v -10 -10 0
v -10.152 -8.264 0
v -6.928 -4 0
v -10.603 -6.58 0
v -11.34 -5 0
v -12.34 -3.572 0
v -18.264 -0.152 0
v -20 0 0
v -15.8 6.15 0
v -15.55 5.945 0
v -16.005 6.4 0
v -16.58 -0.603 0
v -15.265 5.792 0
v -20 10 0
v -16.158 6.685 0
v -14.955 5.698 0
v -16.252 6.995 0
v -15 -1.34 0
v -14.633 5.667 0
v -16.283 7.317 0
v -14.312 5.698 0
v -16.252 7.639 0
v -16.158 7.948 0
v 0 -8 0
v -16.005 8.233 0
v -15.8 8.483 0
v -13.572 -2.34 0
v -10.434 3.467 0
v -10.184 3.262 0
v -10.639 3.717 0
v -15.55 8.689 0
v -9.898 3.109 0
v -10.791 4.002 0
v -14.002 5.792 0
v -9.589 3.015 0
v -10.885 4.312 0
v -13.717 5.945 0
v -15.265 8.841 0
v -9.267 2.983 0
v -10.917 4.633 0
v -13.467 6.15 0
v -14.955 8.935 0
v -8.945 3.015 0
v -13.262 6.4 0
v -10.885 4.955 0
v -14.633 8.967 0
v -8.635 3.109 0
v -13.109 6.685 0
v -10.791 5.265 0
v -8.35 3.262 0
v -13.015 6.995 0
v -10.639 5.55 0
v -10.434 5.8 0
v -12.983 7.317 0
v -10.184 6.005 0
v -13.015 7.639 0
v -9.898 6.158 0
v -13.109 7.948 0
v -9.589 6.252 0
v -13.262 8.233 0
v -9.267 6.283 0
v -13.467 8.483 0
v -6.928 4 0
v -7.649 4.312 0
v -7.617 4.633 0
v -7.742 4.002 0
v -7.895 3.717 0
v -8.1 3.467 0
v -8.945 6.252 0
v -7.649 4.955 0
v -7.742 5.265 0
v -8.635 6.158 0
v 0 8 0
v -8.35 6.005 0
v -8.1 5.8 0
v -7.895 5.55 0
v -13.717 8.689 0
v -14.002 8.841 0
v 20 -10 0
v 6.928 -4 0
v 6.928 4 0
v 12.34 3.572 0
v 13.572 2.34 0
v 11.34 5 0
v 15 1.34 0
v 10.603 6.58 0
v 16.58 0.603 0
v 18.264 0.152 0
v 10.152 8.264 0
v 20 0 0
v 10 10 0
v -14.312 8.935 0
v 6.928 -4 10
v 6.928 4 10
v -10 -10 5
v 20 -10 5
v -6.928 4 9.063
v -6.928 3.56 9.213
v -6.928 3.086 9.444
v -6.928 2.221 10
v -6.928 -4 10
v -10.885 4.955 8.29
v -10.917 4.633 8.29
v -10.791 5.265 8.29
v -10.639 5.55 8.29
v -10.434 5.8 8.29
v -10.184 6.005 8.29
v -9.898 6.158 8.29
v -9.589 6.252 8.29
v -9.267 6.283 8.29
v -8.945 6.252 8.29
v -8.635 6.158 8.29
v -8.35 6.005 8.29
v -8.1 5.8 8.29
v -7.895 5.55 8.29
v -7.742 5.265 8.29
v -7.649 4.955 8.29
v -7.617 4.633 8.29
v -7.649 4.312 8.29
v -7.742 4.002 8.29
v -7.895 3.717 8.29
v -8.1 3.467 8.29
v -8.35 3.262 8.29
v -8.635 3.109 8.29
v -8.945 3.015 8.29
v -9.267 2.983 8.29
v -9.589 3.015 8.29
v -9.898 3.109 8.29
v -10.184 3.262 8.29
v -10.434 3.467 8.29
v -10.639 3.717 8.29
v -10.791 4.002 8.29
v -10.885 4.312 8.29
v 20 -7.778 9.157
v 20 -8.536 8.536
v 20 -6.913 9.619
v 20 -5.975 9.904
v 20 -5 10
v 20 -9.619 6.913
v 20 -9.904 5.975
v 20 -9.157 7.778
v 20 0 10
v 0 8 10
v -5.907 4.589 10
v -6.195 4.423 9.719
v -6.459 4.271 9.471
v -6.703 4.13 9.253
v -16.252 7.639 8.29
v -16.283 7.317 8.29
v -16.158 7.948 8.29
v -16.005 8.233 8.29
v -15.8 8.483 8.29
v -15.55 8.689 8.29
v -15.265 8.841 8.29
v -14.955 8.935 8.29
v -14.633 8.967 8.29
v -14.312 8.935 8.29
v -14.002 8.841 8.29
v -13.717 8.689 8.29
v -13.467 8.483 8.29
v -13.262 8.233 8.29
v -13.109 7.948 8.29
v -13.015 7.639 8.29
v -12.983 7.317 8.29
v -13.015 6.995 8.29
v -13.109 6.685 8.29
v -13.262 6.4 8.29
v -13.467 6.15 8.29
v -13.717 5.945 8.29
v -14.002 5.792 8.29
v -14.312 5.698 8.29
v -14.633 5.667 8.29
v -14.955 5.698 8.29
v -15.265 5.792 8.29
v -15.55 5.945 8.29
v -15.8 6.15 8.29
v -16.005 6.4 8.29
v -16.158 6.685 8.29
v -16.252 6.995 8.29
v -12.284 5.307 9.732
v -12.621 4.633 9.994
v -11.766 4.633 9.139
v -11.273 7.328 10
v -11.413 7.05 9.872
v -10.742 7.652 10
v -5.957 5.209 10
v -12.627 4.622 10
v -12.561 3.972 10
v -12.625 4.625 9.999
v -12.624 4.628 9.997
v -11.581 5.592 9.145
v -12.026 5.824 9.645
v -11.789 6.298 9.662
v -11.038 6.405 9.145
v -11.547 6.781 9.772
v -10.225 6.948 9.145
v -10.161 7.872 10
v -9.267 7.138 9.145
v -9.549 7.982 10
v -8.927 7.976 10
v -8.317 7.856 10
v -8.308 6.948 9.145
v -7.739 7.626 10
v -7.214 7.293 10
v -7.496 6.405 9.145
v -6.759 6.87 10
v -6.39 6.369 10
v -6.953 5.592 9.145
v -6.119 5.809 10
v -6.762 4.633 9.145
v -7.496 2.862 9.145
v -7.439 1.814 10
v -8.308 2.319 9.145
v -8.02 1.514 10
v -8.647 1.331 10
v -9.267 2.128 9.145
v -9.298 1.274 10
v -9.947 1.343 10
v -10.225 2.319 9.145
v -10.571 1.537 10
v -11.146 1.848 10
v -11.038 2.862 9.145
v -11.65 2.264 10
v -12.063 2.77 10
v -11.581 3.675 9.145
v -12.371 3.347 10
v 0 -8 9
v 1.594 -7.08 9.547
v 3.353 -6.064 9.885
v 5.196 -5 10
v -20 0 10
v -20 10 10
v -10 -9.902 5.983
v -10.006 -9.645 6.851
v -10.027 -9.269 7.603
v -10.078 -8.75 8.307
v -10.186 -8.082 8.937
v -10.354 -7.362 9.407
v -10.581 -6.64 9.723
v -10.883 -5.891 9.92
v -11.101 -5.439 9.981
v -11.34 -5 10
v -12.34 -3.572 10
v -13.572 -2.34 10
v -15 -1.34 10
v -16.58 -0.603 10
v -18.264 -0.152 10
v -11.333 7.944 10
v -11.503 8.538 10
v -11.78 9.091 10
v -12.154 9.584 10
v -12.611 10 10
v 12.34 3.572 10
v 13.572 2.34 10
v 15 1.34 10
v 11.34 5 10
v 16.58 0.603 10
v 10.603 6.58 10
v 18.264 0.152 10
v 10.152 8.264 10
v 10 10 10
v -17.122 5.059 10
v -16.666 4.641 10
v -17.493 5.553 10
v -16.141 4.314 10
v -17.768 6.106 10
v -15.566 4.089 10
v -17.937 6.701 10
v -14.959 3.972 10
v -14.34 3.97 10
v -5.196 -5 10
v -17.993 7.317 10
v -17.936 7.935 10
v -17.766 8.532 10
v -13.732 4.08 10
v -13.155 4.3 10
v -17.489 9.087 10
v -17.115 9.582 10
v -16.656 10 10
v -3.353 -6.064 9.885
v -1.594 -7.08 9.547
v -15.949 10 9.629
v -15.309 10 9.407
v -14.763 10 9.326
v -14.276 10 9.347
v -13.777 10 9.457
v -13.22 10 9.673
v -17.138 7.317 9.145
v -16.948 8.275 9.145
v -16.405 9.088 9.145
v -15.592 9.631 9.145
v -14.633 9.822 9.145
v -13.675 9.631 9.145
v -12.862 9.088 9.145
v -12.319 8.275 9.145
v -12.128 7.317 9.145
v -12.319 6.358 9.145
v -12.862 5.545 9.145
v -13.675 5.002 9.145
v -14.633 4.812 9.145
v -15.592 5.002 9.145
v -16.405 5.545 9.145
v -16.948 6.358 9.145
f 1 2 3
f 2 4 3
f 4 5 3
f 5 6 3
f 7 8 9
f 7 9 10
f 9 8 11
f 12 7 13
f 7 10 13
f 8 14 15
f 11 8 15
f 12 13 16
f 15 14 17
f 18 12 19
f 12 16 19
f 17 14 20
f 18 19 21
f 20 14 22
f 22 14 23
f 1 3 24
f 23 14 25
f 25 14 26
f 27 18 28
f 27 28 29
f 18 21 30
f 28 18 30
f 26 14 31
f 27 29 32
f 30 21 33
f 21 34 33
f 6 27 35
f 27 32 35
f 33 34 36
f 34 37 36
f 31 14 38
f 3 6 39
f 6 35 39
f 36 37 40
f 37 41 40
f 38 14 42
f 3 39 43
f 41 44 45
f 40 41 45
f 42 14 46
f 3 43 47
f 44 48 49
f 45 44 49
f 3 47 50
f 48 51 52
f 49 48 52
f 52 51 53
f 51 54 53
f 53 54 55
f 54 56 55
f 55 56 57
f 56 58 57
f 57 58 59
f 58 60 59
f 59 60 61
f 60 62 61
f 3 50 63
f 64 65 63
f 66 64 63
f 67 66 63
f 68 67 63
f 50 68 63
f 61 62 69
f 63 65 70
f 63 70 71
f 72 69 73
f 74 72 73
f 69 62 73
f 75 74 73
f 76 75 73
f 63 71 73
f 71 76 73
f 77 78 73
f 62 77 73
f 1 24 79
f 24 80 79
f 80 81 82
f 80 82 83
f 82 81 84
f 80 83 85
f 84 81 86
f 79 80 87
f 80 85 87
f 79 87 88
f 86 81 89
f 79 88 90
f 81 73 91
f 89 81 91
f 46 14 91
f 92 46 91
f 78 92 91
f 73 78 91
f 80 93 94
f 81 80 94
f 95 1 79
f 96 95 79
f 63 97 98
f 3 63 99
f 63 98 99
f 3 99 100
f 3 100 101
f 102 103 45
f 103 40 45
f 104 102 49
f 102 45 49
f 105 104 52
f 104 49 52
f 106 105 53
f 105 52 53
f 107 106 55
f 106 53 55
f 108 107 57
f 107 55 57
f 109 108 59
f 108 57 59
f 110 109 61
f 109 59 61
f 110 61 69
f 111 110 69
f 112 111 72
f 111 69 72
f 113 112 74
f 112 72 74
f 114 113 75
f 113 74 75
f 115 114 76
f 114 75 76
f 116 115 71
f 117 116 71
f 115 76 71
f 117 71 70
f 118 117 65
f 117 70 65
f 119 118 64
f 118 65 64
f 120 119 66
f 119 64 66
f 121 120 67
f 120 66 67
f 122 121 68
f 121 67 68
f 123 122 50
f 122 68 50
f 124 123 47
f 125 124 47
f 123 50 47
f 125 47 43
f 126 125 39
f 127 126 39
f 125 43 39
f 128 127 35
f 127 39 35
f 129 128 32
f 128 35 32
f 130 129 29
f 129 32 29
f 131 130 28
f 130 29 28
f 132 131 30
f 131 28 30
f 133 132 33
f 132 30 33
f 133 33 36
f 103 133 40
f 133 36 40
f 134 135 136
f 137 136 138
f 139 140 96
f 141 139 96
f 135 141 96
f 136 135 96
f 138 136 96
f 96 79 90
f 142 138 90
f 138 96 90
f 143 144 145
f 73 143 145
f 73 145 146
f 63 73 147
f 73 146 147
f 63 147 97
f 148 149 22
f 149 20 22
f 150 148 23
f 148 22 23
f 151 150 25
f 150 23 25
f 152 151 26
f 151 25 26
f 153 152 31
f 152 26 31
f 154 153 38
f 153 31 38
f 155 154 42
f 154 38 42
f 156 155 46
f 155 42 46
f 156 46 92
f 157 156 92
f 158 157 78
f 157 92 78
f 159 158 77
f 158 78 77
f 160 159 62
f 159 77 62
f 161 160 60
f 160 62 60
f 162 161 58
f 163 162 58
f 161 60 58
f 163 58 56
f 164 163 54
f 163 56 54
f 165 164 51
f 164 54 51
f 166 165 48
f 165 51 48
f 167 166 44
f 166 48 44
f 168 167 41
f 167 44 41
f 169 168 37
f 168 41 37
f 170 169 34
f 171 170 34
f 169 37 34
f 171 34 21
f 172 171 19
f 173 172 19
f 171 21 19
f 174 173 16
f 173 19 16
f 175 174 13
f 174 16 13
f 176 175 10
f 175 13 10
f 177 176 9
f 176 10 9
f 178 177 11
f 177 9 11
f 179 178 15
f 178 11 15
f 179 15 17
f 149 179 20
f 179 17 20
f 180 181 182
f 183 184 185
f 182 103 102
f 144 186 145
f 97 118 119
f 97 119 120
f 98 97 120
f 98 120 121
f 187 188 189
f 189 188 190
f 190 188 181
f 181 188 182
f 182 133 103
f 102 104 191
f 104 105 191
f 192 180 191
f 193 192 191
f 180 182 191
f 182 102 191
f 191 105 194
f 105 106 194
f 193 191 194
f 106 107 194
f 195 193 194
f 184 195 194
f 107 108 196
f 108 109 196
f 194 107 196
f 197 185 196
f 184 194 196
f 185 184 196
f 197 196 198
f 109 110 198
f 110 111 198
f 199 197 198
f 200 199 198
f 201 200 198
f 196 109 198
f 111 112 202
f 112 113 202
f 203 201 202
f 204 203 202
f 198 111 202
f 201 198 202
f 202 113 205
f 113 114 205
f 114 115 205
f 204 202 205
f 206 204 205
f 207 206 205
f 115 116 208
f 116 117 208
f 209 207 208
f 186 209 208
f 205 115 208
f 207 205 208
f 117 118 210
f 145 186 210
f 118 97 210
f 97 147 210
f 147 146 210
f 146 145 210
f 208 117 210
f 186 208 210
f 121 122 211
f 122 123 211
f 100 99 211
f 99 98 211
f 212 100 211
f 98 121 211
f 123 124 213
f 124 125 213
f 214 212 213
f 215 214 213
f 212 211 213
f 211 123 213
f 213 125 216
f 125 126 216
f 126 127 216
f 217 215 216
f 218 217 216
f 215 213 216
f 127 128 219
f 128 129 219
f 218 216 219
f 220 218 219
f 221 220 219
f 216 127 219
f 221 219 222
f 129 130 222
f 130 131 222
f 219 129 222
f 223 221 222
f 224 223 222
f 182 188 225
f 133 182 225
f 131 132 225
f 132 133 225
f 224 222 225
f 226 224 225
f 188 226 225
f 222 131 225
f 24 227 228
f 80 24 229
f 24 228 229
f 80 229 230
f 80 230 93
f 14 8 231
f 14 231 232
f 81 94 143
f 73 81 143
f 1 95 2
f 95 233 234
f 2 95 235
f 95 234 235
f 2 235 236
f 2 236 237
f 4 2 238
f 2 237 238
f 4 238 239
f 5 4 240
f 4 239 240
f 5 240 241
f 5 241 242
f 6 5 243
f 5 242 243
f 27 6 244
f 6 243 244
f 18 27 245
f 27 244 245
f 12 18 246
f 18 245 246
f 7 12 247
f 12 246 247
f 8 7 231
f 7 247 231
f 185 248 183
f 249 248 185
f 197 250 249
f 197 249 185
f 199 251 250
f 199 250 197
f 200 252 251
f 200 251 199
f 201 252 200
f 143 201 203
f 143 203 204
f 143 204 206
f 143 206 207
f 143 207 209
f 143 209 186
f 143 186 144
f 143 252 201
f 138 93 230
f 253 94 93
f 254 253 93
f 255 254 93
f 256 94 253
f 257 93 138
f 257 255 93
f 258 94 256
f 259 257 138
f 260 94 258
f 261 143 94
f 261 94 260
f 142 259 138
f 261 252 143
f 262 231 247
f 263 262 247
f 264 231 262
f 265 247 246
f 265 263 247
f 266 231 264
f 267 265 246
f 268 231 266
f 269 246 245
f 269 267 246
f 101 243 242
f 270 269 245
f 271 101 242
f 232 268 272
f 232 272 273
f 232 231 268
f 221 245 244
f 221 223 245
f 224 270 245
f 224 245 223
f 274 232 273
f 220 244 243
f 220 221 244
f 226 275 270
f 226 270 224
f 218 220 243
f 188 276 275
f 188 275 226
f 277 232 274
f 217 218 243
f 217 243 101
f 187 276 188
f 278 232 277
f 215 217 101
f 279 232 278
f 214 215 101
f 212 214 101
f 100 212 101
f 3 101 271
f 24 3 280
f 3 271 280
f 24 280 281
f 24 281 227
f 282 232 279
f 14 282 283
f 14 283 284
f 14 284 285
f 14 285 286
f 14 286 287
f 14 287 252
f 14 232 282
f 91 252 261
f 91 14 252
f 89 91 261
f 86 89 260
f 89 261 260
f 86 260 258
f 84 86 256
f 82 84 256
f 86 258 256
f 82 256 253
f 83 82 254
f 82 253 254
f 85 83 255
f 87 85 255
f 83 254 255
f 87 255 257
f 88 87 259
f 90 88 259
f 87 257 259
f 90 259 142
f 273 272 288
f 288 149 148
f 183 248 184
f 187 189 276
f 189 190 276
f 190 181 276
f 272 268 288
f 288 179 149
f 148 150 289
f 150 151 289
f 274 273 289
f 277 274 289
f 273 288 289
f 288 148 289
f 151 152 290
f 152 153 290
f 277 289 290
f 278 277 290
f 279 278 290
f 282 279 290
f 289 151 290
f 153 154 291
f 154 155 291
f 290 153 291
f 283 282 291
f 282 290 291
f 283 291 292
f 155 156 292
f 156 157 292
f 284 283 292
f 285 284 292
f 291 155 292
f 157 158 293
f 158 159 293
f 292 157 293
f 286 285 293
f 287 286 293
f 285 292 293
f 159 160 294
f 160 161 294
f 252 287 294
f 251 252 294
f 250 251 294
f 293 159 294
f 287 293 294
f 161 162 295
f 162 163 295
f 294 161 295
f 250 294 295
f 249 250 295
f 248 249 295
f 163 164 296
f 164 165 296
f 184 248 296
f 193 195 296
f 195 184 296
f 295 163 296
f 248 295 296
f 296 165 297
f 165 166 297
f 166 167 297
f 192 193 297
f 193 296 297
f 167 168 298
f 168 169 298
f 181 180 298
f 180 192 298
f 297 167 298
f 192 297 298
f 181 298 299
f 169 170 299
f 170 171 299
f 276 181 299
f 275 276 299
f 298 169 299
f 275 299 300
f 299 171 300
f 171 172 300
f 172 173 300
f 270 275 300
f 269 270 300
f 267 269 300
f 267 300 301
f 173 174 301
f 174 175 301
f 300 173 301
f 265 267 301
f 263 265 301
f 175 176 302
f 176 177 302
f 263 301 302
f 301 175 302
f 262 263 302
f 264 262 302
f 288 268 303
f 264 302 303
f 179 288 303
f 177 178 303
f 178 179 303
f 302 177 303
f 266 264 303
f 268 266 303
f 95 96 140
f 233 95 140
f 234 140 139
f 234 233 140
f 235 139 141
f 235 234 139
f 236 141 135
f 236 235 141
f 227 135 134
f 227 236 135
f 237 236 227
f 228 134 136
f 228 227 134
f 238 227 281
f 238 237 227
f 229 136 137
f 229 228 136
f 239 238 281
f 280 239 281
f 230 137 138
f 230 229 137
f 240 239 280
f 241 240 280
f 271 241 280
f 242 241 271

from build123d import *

# Parameters (mm, degrees)
F0_W           = 40
F0_H           = 20
F1_DEPTH       = 10
F3_DEPTH       = 25
F5_D           = 3.3
F5_CSINK_D     = 6.72
F5_CSINK_ANGLE = 90
F6_T1_DEPTH    = 55


# Not quite as in the source:
# - a fillet or chamfer that OpenCascade refuses, or shapes differently, is made with other operations: its cross-section is extruded or revolved along the edge and cut away or added


with BuildPart() as f1:
    # F0 (on Top) → F1 (new body)
    with BuildSketch(Plane.XY):
        Rectangle(F0_W, F0_H)
    extrude(amount=F1_DEPTH)

    # F2 (on face) → F3 (cut)
    with BuildSketch(Plane.XY.offset(10)):
        Polygon((0, -8), (6.9282032303, -4), (6.9282032303, 4), (0, 8), (-6.9282032303, 4), (-6.9282032303, -4), align=None)
        with BuildLine():
            ThreePointArc((-10, -10), (-12.9289321881, -2.9289321881), (-20, 0))
            Line((-20, 0), (-20, -10))
            Line((-20, -10), (-10, -10))
        make_face()
        with BuildLine():
            Line((20, 10), (10, 10))
            ThreePointArc((10, 10), (12.9289321881, 2.9289321881), (20, 0))
            Line((20, 0), (20, 10))
        make_face()
    extrude(amount=-F3_DEPTH, mode=Mode.SUBTRACT)

    # F5 (through all)
    with Locations(Plane.XY.offset(10)):
        with Locations((-14.633436854, 7.316718427), (-9.266873708, 4.633436854)):
            CounterSinkHole(F5_D / 2, F5_CSINK_D / 2, counter_sink_angle=F5_CSINK_ANGLE)

    # F6: fillet of radius 5 on 1 edges, made by hand

    # F6_s2 → F6_t1 (cut)
    with BuildSketch(Plane.YZ.offset(-22.5)):
        with BuildLine():
            ThreePointArc((-10, 5), (-8.5355339059, 8.5355339059), (-5, 10))
            Line((-5, 10), (-10, 10))
            Line((-10, 10), (-10, 5))
        make_face()
    extrude(amount=F6_T1_DEPTH, mode=Mode.SUBTRACT)


solid = f1.part
